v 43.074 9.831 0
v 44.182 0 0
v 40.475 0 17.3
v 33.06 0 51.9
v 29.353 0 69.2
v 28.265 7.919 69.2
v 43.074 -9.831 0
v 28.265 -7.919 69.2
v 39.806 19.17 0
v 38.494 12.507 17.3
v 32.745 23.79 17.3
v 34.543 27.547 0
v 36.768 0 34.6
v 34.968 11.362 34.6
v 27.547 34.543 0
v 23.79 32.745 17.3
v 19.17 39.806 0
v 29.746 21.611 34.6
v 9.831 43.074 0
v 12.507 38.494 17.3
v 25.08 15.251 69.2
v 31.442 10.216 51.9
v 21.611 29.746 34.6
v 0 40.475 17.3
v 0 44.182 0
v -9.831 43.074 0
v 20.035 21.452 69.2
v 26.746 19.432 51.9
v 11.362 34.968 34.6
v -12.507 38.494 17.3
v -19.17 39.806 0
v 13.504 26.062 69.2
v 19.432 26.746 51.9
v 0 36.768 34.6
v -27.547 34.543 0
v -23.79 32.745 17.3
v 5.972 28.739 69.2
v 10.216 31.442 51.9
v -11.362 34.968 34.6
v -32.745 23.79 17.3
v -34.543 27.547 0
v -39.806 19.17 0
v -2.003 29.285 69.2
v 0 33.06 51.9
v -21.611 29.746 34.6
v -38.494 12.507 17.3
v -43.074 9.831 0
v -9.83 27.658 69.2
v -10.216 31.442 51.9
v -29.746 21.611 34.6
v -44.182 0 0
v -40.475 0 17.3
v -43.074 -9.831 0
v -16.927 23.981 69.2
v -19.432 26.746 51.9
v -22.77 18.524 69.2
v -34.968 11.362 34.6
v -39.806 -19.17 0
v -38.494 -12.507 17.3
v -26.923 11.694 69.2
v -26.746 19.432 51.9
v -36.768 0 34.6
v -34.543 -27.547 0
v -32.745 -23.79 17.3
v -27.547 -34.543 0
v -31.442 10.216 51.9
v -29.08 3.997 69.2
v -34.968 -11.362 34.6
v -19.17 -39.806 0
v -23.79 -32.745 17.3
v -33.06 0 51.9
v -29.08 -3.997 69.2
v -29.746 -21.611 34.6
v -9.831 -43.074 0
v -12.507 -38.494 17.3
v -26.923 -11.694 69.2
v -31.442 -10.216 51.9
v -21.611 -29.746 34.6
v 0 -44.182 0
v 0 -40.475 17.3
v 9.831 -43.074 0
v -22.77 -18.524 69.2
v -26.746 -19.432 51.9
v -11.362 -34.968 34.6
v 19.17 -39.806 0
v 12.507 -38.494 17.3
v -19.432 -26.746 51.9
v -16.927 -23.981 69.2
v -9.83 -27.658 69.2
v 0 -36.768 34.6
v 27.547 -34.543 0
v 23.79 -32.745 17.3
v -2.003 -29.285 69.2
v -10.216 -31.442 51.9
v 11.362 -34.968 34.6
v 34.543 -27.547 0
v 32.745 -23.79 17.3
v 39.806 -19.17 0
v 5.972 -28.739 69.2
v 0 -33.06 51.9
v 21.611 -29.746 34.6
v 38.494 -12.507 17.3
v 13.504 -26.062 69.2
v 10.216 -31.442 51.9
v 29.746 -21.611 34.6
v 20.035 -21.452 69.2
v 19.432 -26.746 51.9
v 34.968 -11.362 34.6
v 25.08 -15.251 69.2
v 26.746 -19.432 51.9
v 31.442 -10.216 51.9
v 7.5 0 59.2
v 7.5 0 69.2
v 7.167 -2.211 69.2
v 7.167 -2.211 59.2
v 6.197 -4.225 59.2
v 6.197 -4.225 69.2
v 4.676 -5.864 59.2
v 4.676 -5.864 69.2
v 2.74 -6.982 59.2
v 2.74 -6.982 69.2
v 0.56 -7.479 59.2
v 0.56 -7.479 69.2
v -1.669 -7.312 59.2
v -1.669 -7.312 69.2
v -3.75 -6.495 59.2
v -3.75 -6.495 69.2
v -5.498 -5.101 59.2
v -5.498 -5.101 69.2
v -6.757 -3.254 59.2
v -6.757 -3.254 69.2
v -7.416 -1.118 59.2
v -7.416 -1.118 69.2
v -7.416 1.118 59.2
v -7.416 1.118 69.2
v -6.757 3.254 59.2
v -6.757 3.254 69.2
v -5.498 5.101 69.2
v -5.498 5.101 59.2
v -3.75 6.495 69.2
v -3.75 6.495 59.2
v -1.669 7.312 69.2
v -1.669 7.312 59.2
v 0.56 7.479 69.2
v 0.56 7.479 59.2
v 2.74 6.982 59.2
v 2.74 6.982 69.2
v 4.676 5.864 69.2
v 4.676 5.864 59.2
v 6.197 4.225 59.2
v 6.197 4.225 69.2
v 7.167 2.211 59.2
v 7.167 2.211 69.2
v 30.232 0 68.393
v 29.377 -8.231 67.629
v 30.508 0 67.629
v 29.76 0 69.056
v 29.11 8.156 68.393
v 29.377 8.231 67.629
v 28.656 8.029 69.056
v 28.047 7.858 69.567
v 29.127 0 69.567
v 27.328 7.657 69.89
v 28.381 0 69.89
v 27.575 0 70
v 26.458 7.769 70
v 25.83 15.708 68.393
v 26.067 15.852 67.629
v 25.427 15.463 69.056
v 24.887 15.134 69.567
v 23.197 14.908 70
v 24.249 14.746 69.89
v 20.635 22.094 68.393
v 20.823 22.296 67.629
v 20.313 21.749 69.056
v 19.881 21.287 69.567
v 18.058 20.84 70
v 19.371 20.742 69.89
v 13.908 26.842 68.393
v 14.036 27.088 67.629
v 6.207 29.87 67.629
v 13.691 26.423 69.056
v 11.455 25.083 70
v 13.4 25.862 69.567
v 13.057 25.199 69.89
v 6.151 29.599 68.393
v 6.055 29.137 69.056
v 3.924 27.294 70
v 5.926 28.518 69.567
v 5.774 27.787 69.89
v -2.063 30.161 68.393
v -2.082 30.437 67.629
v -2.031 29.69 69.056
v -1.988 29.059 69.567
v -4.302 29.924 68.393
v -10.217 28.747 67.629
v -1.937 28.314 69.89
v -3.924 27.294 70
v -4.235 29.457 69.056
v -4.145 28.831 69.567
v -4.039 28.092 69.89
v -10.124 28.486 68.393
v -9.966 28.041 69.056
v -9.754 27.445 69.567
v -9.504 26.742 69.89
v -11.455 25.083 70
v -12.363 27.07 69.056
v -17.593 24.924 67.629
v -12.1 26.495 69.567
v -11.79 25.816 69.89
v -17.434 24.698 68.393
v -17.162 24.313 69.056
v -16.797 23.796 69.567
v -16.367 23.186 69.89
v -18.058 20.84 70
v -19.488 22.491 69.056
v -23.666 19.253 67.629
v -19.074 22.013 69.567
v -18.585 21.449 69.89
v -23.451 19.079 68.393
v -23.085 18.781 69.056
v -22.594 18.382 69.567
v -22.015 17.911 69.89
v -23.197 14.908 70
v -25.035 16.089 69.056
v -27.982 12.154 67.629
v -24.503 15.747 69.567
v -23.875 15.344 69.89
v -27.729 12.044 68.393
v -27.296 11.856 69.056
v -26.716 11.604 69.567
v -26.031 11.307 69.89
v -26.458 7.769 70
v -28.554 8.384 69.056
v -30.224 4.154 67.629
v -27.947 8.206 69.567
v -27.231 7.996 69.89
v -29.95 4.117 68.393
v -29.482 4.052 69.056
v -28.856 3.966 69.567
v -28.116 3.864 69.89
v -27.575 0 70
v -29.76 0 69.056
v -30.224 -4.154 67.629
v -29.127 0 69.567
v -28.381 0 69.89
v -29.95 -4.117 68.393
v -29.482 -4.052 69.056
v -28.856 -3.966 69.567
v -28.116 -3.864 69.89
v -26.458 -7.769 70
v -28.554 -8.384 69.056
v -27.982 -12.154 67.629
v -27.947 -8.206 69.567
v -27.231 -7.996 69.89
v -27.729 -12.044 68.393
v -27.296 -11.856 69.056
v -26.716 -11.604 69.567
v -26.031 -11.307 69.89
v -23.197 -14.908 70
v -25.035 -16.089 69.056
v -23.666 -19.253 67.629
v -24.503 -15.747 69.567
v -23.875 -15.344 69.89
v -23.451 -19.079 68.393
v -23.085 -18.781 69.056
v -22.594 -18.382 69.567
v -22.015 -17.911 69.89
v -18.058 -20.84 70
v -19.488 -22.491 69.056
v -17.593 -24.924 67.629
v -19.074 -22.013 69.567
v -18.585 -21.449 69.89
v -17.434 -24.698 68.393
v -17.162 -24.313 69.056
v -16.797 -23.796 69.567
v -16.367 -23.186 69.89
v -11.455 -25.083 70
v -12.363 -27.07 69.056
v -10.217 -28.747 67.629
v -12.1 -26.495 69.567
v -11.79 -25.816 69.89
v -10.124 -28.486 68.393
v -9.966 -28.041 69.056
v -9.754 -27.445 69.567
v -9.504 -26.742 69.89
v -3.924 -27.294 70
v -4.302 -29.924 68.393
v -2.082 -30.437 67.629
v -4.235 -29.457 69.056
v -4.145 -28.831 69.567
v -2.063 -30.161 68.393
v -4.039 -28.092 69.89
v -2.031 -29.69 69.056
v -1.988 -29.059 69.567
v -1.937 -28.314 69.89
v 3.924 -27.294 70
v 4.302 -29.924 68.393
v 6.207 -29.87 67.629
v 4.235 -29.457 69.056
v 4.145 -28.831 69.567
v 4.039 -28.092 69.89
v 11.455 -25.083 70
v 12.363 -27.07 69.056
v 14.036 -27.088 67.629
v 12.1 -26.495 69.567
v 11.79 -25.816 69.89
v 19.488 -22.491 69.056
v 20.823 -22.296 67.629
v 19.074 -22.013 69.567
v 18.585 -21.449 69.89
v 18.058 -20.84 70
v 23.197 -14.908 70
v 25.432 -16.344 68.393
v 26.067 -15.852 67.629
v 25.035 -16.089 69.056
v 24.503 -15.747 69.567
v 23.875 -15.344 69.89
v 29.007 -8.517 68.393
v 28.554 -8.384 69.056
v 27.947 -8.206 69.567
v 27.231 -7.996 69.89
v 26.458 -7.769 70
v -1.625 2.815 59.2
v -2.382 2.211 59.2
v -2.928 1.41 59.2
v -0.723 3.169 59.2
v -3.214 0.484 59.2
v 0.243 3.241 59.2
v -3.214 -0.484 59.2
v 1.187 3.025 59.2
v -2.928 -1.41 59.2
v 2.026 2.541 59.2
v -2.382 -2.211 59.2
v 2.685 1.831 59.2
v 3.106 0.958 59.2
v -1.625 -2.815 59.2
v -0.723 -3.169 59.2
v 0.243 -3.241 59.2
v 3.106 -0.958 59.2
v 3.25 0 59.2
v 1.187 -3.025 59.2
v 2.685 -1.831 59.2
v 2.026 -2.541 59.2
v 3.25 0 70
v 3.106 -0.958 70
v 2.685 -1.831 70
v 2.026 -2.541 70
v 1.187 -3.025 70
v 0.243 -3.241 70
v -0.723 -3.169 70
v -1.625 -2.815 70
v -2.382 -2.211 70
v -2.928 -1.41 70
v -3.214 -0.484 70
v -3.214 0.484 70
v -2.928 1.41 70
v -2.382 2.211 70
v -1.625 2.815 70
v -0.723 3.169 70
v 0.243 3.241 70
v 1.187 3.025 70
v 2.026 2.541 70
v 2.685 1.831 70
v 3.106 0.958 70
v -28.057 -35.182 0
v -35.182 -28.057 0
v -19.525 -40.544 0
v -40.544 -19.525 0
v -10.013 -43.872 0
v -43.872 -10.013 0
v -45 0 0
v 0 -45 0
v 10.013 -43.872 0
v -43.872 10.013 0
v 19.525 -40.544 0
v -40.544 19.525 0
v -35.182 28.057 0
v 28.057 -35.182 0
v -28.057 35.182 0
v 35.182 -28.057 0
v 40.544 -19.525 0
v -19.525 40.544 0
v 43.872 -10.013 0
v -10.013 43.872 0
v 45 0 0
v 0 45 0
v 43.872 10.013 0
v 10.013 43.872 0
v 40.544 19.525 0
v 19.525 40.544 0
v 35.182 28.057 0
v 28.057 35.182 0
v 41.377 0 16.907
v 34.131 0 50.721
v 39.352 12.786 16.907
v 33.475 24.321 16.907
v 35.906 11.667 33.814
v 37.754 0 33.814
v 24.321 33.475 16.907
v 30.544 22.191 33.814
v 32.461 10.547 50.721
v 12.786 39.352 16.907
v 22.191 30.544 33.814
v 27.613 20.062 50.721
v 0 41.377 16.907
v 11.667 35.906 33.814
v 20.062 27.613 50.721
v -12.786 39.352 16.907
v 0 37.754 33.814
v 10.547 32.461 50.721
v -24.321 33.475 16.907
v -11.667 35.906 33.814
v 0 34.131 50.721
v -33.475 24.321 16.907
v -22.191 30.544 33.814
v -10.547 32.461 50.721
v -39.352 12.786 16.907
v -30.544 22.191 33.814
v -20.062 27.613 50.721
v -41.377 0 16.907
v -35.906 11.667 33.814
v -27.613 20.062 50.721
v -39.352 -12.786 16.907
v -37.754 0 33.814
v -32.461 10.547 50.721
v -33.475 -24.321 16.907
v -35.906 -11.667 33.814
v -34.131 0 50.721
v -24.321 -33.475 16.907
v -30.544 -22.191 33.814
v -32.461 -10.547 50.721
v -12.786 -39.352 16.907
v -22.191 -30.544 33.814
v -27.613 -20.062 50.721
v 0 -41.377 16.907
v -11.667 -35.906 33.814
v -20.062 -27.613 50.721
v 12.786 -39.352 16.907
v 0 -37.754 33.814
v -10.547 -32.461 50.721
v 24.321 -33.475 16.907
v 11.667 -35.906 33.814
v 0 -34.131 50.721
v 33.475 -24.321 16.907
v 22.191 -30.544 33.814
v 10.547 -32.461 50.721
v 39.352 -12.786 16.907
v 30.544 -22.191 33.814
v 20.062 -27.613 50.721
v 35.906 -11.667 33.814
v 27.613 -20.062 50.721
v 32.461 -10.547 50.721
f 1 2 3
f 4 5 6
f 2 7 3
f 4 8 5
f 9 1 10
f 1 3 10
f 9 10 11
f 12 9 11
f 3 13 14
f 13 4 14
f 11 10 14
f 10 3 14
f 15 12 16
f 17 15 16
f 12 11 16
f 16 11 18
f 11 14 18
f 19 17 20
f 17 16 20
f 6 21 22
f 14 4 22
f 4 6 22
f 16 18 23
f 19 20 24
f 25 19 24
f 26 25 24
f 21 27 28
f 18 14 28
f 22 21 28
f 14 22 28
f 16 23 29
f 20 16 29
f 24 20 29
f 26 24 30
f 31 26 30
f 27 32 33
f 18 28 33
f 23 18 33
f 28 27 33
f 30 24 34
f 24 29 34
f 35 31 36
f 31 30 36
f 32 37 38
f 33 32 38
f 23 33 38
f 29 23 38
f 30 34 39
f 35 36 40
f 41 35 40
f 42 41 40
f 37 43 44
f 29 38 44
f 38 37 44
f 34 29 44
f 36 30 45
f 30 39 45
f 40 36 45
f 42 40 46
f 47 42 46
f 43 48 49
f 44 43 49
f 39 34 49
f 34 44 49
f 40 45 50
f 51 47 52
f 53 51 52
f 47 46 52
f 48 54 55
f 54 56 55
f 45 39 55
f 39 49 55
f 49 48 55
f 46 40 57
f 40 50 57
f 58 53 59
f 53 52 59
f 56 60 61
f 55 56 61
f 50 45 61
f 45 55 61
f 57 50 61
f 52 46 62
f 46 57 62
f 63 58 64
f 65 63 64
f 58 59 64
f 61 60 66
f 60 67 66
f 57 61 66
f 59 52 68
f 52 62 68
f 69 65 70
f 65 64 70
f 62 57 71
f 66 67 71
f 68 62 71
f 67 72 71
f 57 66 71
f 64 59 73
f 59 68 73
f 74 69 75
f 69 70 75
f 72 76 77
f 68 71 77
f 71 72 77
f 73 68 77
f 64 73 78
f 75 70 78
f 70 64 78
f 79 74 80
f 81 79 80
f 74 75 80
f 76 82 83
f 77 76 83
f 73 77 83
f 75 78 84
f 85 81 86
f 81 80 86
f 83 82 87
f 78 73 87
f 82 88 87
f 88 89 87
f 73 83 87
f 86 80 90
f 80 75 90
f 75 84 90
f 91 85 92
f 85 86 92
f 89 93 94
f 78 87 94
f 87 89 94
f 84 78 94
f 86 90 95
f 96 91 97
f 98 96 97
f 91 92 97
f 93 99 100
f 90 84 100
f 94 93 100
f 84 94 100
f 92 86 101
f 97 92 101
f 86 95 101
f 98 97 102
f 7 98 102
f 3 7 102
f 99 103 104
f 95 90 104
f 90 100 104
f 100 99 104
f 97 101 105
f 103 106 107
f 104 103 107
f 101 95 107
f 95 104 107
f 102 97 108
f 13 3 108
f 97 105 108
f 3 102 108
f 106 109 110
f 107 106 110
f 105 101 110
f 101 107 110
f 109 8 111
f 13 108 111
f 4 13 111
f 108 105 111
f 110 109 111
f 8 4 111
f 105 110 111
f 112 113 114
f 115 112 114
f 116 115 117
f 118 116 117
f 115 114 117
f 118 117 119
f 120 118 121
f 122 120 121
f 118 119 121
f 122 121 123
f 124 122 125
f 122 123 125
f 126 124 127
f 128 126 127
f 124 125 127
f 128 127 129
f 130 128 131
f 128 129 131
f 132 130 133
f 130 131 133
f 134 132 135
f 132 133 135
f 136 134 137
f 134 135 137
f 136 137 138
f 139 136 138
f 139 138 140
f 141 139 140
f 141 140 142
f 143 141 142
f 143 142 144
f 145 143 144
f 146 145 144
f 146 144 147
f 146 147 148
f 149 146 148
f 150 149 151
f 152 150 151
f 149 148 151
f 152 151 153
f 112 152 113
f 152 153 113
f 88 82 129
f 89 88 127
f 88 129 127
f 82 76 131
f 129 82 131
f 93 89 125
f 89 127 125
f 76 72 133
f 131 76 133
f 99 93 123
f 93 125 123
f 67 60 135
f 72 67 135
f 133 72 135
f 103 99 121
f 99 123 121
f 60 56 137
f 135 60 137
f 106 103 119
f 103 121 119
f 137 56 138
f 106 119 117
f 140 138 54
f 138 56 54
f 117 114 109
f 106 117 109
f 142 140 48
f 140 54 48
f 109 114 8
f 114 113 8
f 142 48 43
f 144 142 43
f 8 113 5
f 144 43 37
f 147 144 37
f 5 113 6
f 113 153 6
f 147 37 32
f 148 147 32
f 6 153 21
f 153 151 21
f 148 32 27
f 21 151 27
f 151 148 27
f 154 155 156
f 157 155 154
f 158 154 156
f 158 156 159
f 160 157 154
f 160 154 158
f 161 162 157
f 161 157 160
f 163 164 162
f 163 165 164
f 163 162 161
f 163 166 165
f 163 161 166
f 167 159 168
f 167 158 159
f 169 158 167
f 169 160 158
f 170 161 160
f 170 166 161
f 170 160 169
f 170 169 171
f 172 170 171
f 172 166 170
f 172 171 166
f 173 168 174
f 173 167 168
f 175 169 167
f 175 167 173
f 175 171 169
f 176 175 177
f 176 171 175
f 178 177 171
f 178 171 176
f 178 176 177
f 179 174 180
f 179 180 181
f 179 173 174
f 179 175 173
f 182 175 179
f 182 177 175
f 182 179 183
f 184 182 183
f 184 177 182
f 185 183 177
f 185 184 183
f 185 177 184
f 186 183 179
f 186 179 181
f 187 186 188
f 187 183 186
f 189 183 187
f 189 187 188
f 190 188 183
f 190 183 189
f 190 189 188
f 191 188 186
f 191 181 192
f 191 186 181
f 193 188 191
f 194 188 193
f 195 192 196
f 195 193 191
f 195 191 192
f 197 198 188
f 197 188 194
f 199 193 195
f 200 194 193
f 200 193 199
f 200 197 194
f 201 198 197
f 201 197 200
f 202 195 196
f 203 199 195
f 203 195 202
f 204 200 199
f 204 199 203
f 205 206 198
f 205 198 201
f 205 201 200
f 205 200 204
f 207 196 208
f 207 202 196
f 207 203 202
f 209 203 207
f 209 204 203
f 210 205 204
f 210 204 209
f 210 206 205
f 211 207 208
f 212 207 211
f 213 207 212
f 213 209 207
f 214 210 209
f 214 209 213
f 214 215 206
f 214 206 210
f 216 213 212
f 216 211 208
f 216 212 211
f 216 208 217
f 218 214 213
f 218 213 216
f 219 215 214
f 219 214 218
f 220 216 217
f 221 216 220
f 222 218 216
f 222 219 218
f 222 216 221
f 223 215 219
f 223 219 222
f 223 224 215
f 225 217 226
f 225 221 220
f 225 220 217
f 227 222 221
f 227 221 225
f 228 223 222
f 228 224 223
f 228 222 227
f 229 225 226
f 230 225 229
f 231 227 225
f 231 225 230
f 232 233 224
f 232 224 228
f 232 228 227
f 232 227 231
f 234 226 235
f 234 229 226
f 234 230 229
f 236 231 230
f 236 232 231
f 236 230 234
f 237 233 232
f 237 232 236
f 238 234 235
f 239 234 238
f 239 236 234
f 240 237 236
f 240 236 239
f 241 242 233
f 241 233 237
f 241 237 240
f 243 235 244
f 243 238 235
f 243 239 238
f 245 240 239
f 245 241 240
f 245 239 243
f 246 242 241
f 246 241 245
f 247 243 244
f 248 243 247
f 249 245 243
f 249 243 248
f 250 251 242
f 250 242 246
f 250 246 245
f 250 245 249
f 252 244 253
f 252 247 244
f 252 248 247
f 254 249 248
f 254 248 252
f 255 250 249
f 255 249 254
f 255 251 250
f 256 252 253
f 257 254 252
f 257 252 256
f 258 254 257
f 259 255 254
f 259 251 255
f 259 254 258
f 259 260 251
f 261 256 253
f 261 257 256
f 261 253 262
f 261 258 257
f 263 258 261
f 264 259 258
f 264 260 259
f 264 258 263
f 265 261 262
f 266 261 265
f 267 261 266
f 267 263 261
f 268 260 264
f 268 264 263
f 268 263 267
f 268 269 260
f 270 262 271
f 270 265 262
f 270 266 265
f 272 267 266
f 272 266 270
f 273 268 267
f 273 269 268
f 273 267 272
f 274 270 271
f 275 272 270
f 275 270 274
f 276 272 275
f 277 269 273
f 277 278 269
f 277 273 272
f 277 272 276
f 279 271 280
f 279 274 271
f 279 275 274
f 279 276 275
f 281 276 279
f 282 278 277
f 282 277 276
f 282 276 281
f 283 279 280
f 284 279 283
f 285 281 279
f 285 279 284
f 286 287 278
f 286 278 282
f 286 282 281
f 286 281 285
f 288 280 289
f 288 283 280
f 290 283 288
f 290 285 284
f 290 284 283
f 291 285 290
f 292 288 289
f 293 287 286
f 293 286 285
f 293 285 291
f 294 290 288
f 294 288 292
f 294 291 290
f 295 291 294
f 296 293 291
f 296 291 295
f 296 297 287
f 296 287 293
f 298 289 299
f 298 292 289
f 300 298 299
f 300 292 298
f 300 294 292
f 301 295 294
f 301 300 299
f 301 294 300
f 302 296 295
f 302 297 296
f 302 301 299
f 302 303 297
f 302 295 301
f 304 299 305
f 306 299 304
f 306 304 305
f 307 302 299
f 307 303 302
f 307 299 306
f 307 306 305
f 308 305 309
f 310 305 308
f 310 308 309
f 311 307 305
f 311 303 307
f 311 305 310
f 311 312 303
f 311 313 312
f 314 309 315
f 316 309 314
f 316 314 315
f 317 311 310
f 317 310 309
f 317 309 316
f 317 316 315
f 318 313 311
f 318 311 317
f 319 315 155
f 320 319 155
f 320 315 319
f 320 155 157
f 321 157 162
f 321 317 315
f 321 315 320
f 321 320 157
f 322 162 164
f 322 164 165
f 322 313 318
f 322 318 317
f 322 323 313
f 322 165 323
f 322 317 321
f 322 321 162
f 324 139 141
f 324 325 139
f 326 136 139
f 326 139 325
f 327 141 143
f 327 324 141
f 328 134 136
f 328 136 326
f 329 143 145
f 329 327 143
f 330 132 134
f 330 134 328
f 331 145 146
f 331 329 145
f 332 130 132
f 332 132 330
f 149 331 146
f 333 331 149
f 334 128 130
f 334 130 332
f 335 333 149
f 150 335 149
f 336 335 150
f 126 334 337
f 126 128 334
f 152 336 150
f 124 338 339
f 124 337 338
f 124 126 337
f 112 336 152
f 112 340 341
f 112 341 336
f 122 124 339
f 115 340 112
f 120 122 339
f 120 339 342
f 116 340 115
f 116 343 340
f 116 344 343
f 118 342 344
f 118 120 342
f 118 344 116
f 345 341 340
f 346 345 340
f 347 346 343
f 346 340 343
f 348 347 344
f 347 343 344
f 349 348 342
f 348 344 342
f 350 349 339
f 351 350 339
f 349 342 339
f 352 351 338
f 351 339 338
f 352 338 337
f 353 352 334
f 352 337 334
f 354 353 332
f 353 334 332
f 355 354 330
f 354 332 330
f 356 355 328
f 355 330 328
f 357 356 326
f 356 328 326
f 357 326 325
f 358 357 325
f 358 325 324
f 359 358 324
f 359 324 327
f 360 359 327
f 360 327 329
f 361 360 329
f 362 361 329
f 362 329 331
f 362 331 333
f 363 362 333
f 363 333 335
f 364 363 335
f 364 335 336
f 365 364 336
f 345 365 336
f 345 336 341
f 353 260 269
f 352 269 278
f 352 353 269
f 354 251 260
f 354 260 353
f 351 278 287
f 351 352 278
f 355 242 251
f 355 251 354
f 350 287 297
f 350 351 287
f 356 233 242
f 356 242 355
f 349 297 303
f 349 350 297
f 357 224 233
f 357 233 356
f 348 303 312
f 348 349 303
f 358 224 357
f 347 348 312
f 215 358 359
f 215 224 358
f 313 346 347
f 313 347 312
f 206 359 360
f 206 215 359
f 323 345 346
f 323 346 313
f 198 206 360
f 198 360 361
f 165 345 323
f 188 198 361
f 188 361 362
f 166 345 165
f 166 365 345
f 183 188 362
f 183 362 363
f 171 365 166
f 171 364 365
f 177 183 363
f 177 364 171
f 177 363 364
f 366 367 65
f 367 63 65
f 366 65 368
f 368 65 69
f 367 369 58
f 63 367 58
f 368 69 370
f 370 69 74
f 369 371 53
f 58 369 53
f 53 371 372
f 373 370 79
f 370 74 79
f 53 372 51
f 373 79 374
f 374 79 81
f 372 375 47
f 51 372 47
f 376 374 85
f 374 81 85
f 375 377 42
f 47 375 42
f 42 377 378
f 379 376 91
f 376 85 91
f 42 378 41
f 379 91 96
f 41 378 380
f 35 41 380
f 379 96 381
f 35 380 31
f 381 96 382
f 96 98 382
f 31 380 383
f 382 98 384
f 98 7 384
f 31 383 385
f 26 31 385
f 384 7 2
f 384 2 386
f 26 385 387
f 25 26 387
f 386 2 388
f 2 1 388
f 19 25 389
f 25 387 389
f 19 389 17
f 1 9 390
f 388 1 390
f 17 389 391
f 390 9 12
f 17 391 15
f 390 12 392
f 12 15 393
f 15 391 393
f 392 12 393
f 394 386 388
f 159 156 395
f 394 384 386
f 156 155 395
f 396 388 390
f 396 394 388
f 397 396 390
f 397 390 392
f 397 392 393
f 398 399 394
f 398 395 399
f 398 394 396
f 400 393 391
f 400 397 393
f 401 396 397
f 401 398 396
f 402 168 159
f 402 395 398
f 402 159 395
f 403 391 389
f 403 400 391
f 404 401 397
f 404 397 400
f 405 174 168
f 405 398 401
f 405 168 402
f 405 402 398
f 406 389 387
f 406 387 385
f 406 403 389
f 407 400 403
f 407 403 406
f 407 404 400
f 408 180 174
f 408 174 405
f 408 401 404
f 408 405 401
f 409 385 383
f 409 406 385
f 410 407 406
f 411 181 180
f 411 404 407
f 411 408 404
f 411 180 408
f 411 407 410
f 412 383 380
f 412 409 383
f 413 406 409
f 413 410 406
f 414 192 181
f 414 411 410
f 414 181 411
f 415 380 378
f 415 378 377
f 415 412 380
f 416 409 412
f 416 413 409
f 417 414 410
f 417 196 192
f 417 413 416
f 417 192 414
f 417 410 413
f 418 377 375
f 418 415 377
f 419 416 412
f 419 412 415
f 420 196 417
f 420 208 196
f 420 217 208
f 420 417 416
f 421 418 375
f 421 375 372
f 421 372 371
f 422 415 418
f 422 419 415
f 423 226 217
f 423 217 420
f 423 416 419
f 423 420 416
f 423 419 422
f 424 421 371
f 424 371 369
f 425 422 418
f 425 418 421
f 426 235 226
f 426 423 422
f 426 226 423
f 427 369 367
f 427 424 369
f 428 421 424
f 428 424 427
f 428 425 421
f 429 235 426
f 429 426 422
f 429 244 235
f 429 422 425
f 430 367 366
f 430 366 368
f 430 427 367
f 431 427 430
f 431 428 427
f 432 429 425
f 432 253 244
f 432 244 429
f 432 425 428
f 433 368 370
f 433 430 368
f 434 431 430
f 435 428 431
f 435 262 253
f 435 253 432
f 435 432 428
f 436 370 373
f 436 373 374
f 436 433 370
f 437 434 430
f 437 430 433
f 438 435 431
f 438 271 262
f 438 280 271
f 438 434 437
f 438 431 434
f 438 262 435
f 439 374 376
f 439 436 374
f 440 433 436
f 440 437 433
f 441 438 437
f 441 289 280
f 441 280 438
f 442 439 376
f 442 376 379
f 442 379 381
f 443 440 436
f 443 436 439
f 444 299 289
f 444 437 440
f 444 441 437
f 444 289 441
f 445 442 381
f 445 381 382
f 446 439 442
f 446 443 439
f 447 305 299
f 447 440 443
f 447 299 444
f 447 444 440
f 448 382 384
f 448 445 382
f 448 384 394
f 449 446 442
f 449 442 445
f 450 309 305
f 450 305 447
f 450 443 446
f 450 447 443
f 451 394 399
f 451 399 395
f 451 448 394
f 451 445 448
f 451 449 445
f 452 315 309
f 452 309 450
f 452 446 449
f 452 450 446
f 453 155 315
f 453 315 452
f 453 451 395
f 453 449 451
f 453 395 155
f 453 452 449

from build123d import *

# Parameters (mm, degrees)
F1_R     = 45
F2_R     = 30
F4_T     = -0.8
F5_R     = 7.5
F6_DEPTH = 10
F7_R     = 3.25
F8_DEPTH = 10.8010001
F9_R     = 3


with BuildPart() as f3:
    # F1 (on Top) → F3 section 0
    with BuildSketch(Plane.XY):
        Circle(F1_R)
    # F2 (on offset) → F3 section 1
    with BuildSketch(Plane.XY.offset(70)):
        Circle(F2_R)
    loft()

    # F4
    f4_openings = [f3.faces().sort_by_distance(p)[0] for p in [
        (0, 0, 0),
    ]]
    offset(amount=F4_T, openings=f4_openings, kind=Kind.INTERSECTION)

    # F5 (on face) → F6 (join)
    with BuildSketch(Plane(origin=(0, 0, 69.2), x_dir=(1, 0, 0), z_dir=(0, 0, -1))):
        Circle(F5_R)
    extrude(amount=F6_DEPTH)

    # F7 (on face) → F8 (cut, through all)
    with BuildSketch(Plane(origin=(0, 0, 59.2), x_dir=(1, 0, 0), z_dir=(0, 0, -1))):
        Circle(F7_R)
    extrude(amount=-F8_DEPTH, mode=Mode.SUBTRACT)

    # F9
    f9_edges = [f3.edges().sort_by_distance(p)[0] for p in [
        (-30, 0, 70),
    ]]
    fillet(f9_edges, radius=F9_R)


solid = f3.part
